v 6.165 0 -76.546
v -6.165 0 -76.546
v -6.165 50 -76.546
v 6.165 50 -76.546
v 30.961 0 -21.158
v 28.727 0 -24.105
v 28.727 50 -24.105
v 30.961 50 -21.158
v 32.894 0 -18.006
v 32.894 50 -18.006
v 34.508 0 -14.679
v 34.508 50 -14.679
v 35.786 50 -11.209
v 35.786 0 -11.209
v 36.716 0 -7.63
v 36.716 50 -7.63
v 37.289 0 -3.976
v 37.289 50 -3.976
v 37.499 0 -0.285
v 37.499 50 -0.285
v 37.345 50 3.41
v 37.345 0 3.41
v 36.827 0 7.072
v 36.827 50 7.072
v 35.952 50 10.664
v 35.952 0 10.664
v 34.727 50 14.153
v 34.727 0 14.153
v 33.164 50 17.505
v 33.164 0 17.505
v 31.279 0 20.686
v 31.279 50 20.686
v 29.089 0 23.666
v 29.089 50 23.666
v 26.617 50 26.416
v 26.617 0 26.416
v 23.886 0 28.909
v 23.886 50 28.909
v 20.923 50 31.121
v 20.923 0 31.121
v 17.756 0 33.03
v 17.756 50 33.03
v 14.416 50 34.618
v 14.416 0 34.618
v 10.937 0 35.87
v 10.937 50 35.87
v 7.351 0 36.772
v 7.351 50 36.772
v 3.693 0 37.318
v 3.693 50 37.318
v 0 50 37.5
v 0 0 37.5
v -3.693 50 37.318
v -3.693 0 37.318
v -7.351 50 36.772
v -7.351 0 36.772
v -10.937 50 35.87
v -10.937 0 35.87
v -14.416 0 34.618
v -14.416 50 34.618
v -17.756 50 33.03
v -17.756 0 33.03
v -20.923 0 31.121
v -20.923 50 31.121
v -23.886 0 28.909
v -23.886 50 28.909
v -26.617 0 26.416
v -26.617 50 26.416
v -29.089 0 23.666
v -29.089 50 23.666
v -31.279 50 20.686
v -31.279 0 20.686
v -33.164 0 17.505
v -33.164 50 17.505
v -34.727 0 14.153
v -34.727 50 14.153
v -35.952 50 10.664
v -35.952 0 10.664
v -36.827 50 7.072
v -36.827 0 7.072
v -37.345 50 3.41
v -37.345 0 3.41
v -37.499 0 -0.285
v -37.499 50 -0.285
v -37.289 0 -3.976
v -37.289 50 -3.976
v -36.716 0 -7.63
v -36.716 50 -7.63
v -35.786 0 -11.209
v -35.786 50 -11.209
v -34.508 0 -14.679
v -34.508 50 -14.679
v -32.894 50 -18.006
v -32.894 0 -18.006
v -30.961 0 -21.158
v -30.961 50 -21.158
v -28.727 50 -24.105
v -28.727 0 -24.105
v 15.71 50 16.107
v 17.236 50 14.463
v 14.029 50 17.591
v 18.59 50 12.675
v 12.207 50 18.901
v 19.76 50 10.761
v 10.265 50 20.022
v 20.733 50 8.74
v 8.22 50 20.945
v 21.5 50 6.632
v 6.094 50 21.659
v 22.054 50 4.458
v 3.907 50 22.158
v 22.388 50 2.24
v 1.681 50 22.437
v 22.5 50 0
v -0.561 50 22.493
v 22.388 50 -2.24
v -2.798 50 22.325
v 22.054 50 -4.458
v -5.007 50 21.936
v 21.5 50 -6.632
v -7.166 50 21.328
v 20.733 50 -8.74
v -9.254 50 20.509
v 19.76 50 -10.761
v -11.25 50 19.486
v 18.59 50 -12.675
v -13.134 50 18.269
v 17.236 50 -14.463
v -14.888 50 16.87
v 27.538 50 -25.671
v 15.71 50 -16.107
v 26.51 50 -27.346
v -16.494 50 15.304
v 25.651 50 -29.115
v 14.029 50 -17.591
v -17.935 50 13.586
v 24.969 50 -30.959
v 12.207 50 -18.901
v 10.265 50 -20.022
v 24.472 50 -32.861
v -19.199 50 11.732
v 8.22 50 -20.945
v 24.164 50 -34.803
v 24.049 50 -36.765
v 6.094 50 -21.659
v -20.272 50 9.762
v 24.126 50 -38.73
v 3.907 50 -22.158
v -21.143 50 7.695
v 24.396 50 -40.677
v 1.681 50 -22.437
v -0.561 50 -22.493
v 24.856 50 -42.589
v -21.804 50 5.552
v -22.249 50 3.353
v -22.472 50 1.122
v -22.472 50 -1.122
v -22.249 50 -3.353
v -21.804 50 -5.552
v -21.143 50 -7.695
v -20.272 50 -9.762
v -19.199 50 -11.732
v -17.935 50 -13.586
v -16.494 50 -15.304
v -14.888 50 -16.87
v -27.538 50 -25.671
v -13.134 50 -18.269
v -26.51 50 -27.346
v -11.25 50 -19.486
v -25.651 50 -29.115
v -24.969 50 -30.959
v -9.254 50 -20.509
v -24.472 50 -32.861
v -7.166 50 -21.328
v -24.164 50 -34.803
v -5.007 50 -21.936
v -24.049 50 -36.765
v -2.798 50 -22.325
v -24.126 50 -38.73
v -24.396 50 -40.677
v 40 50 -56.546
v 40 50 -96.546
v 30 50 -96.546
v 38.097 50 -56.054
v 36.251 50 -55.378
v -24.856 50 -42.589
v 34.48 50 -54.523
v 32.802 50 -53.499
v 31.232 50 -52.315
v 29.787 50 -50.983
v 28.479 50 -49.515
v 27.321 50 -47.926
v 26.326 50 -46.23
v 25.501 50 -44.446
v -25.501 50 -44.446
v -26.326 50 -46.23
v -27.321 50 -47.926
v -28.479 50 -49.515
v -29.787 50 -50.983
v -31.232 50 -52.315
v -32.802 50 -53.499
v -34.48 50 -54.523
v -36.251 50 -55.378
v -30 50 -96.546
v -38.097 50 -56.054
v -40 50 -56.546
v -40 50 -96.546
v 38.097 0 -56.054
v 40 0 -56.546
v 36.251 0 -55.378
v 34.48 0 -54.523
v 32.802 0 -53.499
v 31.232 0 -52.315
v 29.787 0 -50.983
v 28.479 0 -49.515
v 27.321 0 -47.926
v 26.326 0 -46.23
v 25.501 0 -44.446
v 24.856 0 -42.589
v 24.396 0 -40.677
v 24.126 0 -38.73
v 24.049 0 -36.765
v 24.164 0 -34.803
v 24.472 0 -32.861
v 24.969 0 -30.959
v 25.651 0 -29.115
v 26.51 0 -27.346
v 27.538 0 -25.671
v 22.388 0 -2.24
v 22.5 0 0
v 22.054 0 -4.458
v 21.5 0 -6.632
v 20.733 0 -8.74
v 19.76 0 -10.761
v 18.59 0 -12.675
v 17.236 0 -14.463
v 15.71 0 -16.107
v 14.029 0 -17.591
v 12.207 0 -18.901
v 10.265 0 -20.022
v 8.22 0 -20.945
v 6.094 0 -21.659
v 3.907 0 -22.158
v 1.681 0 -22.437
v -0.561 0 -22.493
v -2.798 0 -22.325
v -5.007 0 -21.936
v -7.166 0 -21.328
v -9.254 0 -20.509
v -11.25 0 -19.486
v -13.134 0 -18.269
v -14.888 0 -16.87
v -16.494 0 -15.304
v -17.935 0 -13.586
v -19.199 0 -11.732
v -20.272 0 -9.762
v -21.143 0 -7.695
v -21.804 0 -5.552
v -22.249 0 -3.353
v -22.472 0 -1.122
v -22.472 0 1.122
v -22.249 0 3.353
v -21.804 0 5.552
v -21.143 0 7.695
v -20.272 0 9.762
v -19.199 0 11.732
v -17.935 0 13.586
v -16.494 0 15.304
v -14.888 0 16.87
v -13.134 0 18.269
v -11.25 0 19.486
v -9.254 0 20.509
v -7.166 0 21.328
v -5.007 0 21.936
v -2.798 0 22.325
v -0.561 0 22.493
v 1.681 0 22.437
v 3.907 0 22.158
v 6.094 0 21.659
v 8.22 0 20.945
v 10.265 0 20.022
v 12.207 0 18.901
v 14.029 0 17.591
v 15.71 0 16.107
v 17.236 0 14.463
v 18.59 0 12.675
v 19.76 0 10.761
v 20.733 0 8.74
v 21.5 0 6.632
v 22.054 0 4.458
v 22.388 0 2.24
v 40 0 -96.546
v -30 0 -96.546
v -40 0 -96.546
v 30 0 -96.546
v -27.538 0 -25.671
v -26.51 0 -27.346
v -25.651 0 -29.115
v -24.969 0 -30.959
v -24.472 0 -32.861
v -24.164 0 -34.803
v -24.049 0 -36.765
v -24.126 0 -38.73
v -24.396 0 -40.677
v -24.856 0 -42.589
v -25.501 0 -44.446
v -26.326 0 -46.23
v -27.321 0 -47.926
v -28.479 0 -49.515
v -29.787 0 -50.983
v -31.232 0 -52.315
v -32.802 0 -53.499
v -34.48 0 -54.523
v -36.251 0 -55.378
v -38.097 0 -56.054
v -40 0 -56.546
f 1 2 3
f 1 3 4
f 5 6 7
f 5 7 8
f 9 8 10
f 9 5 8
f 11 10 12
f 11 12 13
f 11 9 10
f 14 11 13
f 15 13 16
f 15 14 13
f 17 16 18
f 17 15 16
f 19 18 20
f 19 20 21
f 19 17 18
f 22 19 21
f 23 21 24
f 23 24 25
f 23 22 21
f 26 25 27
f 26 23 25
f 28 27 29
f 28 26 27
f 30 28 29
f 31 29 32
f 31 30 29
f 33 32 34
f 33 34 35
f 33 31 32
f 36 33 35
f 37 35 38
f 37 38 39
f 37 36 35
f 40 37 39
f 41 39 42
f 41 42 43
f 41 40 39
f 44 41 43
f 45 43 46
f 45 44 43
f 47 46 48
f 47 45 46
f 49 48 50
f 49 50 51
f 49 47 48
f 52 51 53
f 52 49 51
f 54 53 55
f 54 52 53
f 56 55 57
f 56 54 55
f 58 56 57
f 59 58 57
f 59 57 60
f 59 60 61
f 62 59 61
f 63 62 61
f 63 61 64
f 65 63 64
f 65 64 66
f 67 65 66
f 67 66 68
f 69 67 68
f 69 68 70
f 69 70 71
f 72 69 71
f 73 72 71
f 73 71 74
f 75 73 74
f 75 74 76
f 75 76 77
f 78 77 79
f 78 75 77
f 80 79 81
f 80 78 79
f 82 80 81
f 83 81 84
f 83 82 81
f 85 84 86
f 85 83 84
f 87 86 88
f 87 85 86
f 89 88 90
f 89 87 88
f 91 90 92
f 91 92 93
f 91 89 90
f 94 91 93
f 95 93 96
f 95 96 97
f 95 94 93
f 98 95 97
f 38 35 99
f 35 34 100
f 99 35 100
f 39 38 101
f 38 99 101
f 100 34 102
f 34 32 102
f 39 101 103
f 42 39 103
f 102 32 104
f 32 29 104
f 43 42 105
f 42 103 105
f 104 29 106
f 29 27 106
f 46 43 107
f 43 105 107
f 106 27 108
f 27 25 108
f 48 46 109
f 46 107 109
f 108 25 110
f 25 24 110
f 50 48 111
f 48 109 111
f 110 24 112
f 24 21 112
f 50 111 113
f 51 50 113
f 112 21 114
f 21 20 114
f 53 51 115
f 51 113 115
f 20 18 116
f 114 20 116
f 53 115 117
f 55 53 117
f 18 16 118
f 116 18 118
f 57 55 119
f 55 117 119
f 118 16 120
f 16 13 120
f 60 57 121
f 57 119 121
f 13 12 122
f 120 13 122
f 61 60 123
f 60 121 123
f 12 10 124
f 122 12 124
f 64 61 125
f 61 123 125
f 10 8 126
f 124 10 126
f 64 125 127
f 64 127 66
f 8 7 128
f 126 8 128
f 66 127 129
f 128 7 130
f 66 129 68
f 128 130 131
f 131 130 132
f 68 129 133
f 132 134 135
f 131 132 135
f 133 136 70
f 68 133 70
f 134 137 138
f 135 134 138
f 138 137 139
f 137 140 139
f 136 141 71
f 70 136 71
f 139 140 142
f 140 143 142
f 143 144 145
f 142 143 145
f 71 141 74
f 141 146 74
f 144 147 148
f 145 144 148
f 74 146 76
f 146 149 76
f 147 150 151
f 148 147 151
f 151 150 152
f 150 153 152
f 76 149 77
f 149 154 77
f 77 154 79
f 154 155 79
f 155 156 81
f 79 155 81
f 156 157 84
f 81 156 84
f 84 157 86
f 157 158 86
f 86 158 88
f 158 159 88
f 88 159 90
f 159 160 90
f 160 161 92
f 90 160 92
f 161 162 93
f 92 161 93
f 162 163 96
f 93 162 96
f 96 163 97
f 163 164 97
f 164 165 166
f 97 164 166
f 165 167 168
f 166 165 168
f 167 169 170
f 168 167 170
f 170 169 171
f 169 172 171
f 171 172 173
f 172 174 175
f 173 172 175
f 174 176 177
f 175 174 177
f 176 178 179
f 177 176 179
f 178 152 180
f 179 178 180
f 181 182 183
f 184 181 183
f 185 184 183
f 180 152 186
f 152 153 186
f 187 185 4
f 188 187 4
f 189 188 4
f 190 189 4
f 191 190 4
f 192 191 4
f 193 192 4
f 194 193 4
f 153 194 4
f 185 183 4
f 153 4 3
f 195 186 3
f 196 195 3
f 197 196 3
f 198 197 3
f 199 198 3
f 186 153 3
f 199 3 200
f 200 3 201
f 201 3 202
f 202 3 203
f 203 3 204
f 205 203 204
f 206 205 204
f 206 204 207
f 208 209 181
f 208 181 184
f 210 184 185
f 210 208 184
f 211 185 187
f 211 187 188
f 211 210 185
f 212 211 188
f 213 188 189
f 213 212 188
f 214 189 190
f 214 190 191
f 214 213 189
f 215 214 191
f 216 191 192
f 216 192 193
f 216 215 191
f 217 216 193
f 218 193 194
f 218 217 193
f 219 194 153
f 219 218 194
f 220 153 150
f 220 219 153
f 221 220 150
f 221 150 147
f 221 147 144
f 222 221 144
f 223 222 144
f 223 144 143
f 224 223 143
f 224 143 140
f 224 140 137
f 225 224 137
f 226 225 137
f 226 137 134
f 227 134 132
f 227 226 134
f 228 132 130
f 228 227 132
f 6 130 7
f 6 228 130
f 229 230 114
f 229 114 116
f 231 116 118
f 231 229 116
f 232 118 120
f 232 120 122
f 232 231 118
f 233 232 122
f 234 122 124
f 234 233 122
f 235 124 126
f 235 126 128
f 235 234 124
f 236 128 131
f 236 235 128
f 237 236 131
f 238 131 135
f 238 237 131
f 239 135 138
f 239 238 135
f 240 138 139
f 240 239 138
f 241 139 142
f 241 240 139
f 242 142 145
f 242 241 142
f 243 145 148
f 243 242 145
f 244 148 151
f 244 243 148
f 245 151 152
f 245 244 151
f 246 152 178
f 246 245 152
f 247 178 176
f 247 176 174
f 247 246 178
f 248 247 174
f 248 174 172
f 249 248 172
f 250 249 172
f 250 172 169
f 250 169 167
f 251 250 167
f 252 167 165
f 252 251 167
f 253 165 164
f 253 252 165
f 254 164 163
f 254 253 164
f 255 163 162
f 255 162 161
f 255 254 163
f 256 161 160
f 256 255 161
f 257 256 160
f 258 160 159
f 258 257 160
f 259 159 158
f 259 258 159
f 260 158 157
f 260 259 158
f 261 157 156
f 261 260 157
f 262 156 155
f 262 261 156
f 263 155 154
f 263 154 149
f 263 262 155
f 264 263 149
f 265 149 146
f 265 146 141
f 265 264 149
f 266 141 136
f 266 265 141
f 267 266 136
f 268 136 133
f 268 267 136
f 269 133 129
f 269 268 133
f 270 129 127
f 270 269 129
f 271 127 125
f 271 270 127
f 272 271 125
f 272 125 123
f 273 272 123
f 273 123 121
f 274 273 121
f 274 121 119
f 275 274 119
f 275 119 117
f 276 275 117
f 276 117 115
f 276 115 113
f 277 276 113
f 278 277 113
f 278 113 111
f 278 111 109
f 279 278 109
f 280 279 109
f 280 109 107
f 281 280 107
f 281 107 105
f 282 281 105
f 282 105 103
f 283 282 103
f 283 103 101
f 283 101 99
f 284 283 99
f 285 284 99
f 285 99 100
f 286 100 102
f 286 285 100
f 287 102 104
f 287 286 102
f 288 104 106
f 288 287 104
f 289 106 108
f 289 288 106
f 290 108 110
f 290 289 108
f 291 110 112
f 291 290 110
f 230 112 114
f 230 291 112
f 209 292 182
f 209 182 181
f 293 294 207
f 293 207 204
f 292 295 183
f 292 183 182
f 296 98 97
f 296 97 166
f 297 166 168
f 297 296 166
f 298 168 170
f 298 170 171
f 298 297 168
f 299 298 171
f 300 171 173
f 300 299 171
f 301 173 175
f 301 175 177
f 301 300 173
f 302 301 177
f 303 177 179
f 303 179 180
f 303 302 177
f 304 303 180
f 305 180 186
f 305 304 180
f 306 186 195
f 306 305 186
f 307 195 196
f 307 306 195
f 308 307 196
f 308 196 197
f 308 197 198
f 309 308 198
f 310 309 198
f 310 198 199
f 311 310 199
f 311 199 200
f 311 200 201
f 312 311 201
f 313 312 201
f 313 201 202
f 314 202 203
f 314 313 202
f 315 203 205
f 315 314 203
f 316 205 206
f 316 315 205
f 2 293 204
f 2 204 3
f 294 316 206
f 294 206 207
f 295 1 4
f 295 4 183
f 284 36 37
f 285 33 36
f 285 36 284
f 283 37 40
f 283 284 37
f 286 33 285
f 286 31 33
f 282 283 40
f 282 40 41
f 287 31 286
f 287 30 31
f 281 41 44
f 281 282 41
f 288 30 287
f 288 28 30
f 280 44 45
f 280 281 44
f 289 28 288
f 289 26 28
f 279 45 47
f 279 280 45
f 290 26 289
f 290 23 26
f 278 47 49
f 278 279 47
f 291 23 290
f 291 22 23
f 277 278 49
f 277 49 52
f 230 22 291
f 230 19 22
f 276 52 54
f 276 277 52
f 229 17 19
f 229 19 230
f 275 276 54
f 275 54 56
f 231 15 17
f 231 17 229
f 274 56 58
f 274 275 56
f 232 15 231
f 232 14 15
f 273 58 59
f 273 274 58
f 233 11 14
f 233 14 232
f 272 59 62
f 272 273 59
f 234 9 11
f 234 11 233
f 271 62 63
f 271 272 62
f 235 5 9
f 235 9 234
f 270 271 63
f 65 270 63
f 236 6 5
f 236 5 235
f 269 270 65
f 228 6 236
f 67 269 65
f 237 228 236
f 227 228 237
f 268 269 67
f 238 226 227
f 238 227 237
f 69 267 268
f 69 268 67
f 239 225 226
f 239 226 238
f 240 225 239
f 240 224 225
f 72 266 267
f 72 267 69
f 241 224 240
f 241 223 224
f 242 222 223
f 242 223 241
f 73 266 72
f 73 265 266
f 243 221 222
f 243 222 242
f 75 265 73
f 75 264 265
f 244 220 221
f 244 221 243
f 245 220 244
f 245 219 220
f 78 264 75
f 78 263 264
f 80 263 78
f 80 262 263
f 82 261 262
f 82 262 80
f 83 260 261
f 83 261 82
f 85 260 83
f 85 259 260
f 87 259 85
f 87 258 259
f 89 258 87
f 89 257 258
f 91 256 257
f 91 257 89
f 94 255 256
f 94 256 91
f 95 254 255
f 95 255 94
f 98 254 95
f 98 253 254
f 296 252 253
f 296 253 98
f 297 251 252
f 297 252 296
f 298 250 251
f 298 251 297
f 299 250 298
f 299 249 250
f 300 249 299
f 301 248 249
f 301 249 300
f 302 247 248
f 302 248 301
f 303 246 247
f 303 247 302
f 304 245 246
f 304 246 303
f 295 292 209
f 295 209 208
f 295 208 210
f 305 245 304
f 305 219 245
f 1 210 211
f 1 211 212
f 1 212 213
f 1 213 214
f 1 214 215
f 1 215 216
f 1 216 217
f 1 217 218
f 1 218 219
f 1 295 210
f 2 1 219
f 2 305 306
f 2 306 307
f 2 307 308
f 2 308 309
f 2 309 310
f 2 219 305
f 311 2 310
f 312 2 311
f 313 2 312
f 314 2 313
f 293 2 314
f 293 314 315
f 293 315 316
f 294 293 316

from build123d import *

# Parameters (mm, degrees)
CROQUIS2_R              = 22.5
SALIENTE_EXTRUIR1_DEPTH = 50


with BuildPart() as part:
    # Croquis2 → Saliente-Extruir1 (new body)
    with BuildSketch(Plane(origin=(0, 0, 0), x_dir=(1, 0, 0), z_dir=(0, 1, 0))):
        with BuildLine():
            Line((-6.164928148, 76.54643814), (6.164928148, 76.54643814))
            Line((6.164928148, 76.54643814), (30, 96.54643814))
            Line((30, 96.54643814), (40, 96.54643814))
            Line((40, 96.54643814), (40, 56.54643814))
            ThreePointArc((40, 56.54643814), (25.155667723, 43.525085879), (28.726666617, 24.104535363))
            ThreePointArc((28.726666617, 24.104535363), (0, -37.5), (-28.726666617, 24.104535363))
            ThreePointArc((-28.726666617, 24.104535363), (-25.155667723, 43.525085879), (-40, 56.54643814))
            Line((-40, 56.54643814), (-40, 96.54643814))
            Line((-40, 96.54643814), (-30, 96.54643814))
            Line((-30, 96.54643814), (-6.164928148, 76.54643814))
        make_face()
        Circle(CROQUIS2_R, mode=Mode.SUBTRACT)
    extrude(amount=SALIENTE_EXTRUIR1_DEPTH)


solid = part.part
